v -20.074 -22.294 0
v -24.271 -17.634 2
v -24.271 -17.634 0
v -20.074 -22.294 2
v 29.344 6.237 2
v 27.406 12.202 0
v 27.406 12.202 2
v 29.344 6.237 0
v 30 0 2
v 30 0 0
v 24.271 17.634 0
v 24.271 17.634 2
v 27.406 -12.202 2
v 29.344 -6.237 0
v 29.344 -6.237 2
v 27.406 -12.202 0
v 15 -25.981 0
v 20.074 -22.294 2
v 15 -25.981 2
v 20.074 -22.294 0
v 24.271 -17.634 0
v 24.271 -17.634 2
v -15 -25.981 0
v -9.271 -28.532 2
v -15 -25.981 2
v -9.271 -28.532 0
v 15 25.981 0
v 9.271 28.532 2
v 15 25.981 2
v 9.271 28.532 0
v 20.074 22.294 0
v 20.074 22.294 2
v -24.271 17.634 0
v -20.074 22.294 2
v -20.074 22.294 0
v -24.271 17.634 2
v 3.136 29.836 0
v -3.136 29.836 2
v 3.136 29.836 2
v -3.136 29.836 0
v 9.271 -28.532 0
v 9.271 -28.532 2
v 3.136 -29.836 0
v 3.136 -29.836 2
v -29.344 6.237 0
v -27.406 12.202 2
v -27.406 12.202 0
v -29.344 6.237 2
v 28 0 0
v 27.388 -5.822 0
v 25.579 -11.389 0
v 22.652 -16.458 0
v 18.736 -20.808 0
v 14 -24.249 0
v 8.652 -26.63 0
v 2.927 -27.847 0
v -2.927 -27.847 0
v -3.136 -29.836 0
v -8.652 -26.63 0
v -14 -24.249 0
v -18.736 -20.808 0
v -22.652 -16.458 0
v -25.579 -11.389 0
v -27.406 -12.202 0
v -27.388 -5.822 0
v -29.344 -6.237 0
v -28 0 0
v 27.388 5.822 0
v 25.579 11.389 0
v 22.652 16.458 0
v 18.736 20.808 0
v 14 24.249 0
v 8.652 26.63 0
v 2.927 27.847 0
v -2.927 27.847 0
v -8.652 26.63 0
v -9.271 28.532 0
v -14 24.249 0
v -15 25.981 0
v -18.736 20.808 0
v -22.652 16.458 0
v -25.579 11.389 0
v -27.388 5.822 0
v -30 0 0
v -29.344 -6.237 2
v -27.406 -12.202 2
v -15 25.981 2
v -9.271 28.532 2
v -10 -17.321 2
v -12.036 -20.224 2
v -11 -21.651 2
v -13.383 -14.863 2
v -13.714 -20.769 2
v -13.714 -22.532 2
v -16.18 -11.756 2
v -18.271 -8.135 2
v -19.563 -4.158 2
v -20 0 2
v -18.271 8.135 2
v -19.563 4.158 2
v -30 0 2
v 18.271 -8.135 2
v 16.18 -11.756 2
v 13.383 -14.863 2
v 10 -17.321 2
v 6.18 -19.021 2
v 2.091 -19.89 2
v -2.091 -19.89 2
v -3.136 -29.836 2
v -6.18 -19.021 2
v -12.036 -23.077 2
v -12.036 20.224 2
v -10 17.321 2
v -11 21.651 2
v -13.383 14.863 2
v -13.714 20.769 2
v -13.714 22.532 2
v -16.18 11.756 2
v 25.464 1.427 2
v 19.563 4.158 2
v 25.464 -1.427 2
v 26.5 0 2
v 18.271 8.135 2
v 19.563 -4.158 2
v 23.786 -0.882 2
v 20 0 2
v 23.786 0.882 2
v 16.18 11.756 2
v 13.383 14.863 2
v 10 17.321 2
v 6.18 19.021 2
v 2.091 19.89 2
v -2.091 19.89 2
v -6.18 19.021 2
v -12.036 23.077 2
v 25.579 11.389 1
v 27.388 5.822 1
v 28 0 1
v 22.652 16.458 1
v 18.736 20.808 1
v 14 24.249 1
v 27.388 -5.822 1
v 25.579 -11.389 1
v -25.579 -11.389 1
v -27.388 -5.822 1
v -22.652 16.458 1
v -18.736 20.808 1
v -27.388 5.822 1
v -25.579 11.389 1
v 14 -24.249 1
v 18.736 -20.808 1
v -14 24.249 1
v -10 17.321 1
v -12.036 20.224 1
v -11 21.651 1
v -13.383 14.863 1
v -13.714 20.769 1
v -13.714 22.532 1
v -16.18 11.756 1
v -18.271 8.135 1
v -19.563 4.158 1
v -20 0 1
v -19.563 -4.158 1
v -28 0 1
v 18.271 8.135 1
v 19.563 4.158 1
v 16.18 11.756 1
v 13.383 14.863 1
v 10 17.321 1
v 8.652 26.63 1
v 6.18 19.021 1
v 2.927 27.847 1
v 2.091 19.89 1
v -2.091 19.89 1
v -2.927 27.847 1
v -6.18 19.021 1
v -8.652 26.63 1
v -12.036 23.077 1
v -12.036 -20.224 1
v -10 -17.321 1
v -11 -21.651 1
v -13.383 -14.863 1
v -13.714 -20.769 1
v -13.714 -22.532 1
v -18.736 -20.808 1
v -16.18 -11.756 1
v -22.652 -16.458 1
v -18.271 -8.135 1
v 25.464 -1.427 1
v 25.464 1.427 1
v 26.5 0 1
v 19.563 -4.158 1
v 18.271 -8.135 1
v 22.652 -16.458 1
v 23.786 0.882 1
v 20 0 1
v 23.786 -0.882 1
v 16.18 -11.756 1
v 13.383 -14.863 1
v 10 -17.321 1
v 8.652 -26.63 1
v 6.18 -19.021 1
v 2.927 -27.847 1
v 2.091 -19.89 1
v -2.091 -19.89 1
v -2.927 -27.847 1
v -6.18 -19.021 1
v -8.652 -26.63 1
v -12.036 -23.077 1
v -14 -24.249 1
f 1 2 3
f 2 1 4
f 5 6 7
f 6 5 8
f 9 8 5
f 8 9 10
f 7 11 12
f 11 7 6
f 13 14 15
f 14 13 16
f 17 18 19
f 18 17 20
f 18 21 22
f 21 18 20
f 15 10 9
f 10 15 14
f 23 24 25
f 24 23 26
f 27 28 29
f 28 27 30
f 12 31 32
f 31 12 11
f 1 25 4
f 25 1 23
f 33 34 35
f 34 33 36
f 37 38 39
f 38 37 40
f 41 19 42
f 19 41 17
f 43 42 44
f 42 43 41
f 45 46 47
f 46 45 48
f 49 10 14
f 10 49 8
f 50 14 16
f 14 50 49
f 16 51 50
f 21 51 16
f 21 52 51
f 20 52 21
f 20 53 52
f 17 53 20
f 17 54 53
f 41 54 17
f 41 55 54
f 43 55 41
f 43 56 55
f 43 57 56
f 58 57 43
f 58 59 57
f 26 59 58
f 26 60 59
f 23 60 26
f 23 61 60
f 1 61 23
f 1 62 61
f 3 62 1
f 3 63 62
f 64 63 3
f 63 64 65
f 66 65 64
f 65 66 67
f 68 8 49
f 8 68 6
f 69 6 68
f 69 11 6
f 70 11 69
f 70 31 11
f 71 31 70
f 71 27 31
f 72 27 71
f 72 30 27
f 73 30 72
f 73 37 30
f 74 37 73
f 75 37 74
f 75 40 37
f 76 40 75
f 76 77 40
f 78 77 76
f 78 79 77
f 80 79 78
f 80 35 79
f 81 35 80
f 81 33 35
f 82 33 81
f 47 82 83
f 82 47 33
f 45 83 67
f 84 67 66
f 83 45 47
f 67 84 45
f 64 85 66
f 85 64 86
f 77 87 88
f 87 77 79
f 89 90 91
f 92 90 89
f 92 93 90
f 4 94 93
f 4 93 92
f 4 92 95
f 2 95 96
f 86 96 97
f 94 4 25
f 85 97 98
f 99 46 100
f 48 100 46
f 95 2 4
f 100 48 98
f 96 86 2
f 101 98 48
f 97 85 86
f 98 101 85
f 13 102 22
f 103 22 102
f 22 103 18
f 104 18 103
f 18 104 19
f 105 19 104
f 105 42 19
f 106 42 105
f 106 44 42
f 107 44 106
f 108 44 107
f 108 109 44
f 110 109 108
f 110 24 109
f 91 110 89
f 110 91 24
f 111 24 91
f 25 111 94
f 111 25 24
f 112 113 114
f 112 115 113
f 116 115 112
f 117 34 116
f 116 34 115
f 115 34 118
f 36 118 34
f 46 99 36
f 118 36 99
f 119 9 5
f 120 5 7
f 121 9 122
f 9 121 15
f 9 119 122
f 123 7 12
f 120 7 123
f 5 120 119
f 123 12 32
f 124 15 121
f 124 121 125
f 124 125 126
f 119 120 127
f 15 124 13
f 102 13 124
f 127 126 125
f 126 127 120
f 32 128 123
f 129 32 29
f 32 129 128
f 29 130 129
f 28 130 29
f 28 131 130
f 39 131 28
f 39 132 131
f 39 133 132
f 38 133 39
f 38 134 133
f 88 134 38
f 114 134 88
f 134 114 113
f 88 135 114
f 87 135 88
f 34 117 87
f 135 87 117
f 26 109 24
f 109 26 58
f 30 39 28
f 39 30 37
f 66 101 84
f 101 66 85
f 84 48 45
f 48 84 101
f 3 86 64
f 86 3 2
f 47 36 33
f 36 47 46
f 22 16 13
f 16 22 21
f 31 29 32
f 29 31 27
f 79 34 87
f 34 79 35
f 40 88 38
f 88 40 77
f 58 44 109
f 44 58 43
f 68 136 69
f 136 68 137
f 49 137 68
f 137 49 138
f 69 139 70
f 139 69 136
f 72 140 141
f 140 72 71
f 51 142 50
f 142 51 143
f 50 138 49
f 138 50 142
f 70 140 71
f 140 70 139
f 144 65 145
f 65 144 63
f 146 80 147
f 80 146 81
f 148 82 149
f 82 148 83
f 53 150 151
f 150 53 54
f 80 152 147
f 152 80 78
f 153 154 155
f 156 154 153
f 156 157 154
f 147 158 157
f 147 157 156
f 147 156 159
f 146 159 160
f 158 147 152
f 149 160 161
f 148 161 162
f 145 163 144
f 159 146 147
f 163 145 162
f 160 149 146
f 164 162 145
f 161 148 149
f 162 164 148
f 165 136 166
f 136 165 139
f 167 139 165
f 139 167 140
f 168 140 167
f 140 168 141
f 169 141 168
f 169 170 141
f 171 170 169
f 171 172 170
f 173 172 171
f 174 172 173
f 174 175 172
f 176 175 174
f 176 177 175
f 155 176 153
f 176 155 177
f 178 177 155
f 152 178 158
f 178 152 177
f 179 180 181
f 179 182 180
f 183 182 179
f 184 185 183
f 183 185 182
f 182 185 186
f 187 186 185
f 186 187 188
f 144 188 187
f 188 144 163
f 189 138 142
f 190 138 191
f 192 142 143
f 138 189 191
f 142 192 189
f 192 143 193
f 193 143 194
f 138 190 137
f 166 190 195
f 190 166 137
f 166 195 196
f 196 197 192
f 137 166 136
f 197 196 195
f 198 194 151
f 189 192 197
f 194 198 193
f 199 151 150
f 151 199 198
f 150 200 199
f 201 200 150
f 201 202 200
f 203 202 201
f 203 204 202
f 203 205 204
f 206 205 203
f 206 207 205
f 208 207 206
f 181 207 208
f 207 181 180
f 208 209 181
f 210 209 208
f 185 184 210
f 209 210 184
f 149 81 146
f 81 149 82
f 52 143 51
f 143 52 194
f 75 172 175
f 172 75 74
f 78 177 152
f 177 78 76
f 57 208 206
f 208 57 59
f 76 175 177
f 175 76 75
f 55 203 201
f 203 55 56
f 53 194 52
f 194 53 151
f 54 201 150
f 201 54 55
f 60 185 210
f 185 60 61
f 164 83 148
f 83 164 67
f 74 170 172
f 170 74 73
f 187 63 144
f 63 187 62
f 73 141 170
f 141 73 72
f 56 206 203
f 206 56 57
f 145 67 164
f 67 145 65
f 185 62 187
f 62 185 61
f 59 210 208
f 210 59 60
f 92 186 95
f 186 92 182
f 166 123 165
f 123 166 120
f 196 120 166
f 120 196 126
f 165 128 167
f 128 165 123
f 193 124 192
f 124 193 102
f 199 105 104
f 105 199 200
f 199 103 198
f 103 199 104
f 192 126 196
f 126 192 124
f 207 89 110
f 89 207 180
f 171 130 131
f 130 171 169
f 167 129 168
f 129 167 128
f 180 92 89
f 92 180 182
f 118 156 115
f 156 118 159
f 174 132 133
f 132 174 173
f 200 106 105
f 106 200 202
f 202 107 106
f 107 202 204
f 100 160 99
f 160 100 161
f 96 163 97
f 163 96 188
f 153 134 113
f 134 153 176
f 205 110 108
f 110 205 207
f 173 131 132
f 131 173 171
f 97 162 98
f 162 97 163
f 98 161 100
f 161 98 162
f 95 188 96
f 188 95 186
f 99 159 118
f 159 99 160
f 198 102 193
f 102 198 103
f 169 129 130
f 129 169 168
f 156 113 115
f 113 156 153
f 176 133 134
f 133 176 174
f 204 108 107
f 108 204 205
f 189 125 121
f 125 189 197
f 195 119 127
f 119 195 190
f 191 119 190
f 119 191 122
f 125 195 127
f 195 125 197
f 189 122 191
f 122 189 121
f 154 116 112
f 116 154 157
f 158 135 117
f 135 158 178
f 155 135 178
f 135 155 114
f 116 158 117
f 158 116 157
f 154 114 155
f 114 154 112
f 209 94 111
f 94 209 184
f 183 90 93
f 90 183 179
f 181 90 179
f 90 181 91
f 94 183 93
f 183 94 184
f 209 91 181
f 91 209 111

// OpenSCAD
echo(version=version());

h1=2;     //height of cover
d_out=60; //outer diameter
d_in=40;  //inner diameter
d_hole=3; //hole diameter

cover (h1,d_out/2,d_in/2,d_hole/2);

module cover (hi,r1,r2,r3){ 
    t1=r1/2+r2/2; // middle radius
    difference() {  //subtract
    cylinder(h = hi, r = r1); //outer
        translate([0, 0, 0])
     cylinder(h = hi/2, r = r1-2); //bottom
    translate([0, 0, -1])
      cylinder(h = hi*2, r = r2); //inner
    translate([t1, 0, 0])          
       cylinder(h = hi, r = r3); // first hole
    translate([-sin(30)*t1, cos(30)*t1, 0])  
       cylinder(h = hi, r = r3); //second hole
    translate([-sin(30)*t1, -cos(30)*t1, 0])
        cylinder(h = hi, r = r3); //third hole
  }
 }
 
